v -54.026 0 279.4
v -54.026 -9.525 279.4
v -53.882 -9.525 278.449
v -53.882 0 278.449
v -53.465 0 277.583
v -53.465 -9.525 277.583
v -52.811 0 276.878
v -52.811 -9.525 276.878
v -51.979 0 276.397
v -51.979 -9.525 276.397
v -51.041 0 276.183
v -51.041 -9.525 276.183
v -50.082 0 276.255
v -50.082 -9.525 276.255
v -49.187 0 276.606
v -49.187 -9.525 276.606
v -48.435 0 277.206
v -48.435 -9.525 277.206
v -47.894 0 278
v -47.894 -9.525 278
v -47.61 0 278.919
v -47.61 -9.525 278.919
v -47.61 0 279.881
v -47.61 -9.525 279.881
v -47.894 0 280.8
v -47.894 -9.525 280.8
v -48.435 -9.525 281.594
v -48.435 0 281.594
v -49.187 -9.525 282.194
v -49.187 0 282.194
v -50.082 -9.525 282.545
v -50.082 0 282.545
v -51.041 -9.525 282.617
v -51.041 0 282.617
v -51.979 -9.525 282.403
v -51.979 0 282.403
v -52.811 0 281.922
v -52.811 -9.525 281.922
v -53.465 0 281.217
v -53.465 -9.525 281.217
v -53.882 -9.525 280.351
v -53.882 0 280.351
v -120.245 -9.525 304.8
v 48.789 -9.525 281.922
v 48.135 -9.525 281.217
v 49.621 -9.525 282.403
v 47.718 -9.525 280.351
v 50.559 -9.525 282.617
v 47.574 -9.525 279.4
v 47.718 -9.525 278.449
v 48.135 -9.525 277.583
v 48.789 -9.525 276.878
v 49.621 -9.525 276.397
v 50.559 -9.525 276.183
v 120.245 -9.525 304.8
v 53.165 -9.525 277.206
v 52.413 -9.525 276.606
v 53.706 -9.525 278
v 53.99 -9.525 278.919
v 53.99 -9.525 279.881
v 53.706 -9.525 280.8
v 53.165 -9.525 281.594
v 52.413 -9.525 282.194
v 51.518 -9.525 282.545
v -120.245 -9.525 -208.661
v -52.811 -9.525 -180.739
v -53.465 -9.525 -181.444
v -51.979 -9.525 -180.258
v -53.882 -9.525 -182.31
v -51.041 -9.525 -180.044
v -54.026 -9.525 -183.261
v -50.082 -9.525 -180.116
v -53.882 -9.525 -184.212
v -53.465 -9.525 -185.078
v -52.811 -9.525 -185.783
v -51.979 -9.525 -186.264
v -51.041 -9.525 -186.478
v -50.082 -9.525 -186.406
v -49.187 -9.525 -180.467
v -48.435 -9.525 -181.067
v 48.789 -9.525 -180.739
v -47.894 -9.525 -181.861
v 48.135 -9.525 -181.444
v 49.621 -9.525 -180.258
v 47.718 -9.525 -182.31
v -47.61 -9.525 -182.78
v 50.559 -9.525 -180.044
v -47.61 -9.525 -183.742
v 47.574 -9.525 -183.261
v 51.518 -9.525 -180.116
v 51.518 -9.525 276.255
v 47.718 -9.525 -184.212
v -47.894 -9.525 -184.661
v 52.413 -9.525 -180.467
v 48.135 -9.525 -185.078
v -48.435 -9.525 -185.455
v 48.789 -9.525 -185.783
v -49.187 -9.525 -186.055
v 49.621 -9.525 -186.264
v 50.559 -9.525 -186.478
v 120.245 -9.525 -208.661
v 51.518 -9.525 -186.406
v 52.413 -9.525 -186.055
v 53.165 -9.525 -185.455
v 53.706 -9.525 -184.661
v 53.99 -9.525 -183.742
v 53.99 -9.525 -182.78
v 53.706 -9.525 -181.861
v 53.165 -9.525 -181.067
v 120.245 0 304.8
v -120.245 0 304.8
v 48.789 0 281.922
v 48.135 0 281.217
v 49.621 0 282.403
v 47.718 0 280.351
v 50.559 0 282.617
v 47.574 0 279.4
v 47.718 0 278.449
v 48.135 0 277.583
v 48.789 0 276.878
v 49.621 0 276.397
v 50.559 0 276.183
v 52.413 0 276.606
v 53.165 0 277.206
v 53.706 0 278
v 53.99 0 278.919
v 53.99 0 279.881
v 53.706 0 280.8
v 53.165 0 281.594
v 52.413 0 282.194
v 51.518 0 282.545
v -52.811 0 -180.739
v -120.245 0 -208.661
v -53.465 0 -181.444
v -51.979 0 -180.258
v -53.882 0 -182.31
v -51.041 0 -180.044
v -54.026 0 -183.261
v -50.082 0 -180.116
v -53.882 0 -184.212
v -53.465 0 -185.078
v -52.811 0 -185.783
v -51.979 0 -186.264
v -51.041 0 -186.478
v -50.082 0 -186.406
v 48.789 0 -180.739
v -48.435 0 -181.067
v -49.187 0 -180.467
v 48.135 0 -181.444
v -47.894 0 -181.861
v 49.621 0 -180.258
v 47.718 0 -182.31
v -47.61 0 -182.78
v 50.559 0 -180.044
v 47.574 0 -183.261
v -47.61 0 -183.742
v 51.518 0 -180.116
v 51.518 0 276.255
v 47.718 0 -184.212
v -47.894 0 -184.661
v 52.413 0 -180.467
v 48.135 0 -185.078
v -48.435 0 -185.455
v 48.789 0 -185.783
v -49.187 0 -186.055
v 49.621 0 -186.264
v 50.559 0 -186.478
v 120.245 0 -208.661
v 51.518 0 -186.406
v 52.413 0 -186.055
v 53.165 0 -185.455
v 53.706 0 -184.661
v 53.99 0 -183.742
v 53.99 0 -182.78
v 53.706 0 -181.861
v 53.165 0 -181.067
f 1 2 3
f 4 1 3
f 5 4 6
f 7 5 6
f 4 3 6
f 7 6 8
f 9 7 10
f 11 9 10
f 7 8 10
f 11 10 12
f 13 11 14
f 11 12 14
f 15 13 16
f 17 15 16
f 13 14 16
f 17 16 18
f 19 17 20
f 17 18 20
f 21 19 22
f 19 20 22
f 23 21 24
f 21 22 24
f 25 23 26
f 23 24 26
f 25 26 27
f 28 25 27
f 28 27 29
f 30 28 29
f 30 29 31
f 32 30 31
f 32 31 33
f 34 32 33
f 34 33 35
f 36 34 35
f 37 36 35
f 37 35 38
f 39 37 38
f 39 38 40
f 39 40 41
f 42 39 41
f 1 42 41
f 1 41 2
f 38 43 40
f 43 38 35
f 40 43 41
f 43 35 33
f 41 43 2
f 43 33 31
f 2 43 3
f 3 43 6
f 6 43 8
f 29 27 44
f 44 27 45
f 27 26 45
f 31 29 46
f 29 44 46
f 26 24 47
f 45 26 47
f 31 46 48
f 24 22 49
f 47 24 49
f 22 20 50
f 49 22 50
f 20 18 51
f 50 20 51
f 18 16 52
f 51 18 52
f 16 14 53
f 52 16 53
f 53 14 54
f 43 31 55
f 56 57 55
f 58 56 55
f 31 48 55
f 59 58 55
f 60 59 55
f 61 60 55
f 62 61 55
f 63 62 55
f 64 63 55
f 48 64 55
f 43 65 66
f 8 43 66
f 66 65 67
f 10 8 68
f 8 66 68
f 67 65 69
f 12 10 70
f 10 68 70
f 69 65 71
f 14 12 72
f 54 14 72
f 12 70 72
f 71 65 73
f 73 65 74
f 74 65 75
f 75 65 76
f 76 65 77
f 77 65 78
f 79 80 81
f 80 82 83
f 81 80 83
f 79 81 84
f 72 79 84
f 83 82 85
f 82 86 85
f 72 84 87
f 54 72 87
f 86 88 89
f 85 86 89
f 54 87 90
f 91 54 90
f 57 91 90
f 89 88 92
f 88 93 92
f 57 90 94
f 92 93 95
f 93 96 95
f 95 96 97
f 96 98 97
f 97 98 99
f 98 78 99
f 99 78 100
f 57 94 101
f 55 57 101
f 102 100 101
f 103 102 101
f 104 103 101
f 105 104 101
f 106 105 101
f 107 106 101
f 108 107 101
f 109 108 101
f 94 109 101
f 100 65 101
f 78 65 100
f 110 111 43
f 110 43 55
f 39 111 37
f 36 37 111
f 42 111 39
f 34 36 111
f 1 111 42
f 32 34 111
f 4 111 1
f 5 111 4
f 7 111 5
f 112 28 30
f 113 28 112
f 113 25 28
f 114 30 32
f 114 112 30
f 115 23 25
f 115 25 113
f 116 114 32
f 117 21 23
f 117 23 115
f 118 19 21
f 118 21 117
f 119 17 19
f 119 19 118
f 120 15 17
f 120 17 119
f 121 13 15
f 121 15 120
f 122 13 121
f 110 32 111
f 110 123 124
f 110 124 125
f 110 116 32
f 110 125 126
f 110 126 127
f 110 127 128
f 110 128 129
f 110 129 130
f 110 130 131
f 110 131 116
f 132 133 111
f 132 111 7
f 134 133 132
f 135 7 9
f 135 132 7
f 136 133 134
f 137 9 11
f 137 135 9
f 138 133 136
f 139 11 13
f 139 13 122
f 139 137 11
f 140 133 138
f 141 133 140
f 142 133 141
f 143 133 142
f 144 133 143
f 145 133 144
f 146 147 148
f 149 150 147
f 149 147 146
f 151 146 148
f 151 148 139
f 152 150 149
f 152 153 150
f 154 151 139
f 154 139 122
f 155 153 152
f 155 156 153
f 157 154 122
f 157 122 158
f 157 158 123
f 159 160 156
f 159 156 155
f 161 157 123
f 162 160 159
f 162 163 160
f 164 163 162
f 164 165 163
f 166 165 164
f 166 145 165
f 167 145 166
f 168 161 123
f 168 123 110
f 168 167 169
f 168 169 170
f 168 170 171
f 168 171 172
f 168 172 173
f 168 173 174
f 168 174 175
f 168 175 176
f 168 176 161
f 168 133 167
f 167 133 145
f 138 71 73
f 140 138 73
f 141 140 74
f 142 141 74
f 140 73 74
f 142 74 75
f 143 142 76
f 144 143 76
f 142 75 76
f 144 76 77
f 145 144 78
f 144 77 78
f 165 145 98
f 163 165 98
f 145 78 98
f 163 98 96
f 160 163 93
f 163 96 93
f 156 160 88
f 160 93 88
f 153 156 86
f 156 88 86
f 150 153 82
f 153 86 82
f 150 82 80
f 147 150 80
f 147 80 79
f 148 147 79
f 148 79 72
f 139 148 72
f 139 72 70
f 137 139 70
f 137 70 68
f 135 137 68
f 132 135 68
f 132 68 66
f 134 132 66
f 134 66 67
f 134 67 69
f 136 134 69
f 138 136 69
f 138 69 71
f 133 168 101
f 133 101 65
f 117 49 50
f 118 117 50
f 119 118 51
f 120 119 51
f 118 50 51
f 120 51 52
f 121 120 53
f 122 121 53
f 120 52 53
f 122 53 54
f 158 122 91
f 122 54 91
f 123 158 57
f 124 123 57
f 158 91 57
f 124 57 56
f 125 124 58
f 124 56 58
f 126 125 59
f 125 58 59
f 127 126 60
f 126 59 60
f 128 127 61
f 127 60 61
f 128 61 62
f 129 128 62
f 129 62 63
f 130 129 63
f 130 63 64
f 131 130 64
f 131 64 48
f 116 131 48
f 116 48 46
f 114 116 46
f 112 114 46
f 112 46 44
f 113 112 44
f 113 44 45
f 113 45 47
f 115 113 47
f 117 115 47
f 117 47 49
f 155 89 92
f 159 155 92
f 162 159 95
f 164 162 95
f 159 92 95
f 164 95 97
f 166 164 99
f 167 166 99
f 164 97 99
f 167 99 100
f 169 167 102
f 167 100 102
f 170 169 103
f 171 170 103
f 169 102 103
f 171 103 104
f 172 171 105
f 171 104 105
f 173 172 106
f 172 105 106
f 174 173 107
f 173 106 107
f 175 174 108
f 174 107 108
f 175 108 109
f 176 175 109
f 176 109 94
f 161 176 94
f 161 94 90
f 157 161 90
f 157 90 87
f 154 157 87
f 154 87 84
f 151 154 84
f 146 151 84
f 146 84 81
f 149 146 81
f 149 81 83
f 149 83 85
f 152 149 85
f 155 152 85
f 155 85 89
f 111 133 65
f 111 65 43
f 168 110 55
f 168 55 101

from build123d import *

# Parameters (mm, degrees)
SKETCH3_W           = 304.8
SKETCH3_H           = 609.6
BOSS_EXTRUDE1_DEPTH = 9.525
CUT_EXTRUDE1_DEPTH  = 15.24
SKETCH9_R           = 3.2258
CUT_EXTRUDE3_DEPTH  = 10.525


with BuildPart() as part:
    # Sketch3 → Boss-Extrude1 (new body)
    with BuildSketch(Plane(origin=(0, 0, 0), x_dir=(1, 0, 0), z_dir=(0, 1, 0))):
        Rectangle(SKETCH3_W, SKETCH3_H)
    extrude(amount=-BOSS_EXTRUDE1_DEPTH)

    # Sketch4 → Cut-Extrude1 (cut)
    with BuildSketch(Plane(origin=(0, 0, 0), x_dir=(1, 0, 0), z_dir=(0, 1, 0))):
        Polygon((-152.4, 304.8), (152.4, 304.8), (152.4, 208.661), (152.4, -304.8), (120.245, -304.8), (120.245, 208.661), (-120.245, 208.661), (-120.245, -304.8), (-152.4, -304.8), (-152.4, 208.661), align=None)
    extrude(amount=-CUT_EXTRUDE1_DEPTH, mode=Mode.SUBTRACT)

    # Sketch9 → Cut-Extrude3 (cut, through all)
    with BuildSketch(Plane(origin=(0, -9.525, 0), x_dir=(-1, 0, 0), z_dir=(0, -1, 0))):
        with Locations((-50.8, 183.261)):
            Circle(SKETCH9_R)
        with Locations((50.8, 183.261)):
            Circle(SKETCH9_R)
        with Locations((50.8, -279.4)):
            Circle(SKETCH9_R)
        with Locations((-50.8, -279.4)):
            Circle(SKETCH9_R)
    extrude(amount=-CUT_EXTRUDE3_DEPTH, mode=Mode.SUBTRACT)


solid = part.part
